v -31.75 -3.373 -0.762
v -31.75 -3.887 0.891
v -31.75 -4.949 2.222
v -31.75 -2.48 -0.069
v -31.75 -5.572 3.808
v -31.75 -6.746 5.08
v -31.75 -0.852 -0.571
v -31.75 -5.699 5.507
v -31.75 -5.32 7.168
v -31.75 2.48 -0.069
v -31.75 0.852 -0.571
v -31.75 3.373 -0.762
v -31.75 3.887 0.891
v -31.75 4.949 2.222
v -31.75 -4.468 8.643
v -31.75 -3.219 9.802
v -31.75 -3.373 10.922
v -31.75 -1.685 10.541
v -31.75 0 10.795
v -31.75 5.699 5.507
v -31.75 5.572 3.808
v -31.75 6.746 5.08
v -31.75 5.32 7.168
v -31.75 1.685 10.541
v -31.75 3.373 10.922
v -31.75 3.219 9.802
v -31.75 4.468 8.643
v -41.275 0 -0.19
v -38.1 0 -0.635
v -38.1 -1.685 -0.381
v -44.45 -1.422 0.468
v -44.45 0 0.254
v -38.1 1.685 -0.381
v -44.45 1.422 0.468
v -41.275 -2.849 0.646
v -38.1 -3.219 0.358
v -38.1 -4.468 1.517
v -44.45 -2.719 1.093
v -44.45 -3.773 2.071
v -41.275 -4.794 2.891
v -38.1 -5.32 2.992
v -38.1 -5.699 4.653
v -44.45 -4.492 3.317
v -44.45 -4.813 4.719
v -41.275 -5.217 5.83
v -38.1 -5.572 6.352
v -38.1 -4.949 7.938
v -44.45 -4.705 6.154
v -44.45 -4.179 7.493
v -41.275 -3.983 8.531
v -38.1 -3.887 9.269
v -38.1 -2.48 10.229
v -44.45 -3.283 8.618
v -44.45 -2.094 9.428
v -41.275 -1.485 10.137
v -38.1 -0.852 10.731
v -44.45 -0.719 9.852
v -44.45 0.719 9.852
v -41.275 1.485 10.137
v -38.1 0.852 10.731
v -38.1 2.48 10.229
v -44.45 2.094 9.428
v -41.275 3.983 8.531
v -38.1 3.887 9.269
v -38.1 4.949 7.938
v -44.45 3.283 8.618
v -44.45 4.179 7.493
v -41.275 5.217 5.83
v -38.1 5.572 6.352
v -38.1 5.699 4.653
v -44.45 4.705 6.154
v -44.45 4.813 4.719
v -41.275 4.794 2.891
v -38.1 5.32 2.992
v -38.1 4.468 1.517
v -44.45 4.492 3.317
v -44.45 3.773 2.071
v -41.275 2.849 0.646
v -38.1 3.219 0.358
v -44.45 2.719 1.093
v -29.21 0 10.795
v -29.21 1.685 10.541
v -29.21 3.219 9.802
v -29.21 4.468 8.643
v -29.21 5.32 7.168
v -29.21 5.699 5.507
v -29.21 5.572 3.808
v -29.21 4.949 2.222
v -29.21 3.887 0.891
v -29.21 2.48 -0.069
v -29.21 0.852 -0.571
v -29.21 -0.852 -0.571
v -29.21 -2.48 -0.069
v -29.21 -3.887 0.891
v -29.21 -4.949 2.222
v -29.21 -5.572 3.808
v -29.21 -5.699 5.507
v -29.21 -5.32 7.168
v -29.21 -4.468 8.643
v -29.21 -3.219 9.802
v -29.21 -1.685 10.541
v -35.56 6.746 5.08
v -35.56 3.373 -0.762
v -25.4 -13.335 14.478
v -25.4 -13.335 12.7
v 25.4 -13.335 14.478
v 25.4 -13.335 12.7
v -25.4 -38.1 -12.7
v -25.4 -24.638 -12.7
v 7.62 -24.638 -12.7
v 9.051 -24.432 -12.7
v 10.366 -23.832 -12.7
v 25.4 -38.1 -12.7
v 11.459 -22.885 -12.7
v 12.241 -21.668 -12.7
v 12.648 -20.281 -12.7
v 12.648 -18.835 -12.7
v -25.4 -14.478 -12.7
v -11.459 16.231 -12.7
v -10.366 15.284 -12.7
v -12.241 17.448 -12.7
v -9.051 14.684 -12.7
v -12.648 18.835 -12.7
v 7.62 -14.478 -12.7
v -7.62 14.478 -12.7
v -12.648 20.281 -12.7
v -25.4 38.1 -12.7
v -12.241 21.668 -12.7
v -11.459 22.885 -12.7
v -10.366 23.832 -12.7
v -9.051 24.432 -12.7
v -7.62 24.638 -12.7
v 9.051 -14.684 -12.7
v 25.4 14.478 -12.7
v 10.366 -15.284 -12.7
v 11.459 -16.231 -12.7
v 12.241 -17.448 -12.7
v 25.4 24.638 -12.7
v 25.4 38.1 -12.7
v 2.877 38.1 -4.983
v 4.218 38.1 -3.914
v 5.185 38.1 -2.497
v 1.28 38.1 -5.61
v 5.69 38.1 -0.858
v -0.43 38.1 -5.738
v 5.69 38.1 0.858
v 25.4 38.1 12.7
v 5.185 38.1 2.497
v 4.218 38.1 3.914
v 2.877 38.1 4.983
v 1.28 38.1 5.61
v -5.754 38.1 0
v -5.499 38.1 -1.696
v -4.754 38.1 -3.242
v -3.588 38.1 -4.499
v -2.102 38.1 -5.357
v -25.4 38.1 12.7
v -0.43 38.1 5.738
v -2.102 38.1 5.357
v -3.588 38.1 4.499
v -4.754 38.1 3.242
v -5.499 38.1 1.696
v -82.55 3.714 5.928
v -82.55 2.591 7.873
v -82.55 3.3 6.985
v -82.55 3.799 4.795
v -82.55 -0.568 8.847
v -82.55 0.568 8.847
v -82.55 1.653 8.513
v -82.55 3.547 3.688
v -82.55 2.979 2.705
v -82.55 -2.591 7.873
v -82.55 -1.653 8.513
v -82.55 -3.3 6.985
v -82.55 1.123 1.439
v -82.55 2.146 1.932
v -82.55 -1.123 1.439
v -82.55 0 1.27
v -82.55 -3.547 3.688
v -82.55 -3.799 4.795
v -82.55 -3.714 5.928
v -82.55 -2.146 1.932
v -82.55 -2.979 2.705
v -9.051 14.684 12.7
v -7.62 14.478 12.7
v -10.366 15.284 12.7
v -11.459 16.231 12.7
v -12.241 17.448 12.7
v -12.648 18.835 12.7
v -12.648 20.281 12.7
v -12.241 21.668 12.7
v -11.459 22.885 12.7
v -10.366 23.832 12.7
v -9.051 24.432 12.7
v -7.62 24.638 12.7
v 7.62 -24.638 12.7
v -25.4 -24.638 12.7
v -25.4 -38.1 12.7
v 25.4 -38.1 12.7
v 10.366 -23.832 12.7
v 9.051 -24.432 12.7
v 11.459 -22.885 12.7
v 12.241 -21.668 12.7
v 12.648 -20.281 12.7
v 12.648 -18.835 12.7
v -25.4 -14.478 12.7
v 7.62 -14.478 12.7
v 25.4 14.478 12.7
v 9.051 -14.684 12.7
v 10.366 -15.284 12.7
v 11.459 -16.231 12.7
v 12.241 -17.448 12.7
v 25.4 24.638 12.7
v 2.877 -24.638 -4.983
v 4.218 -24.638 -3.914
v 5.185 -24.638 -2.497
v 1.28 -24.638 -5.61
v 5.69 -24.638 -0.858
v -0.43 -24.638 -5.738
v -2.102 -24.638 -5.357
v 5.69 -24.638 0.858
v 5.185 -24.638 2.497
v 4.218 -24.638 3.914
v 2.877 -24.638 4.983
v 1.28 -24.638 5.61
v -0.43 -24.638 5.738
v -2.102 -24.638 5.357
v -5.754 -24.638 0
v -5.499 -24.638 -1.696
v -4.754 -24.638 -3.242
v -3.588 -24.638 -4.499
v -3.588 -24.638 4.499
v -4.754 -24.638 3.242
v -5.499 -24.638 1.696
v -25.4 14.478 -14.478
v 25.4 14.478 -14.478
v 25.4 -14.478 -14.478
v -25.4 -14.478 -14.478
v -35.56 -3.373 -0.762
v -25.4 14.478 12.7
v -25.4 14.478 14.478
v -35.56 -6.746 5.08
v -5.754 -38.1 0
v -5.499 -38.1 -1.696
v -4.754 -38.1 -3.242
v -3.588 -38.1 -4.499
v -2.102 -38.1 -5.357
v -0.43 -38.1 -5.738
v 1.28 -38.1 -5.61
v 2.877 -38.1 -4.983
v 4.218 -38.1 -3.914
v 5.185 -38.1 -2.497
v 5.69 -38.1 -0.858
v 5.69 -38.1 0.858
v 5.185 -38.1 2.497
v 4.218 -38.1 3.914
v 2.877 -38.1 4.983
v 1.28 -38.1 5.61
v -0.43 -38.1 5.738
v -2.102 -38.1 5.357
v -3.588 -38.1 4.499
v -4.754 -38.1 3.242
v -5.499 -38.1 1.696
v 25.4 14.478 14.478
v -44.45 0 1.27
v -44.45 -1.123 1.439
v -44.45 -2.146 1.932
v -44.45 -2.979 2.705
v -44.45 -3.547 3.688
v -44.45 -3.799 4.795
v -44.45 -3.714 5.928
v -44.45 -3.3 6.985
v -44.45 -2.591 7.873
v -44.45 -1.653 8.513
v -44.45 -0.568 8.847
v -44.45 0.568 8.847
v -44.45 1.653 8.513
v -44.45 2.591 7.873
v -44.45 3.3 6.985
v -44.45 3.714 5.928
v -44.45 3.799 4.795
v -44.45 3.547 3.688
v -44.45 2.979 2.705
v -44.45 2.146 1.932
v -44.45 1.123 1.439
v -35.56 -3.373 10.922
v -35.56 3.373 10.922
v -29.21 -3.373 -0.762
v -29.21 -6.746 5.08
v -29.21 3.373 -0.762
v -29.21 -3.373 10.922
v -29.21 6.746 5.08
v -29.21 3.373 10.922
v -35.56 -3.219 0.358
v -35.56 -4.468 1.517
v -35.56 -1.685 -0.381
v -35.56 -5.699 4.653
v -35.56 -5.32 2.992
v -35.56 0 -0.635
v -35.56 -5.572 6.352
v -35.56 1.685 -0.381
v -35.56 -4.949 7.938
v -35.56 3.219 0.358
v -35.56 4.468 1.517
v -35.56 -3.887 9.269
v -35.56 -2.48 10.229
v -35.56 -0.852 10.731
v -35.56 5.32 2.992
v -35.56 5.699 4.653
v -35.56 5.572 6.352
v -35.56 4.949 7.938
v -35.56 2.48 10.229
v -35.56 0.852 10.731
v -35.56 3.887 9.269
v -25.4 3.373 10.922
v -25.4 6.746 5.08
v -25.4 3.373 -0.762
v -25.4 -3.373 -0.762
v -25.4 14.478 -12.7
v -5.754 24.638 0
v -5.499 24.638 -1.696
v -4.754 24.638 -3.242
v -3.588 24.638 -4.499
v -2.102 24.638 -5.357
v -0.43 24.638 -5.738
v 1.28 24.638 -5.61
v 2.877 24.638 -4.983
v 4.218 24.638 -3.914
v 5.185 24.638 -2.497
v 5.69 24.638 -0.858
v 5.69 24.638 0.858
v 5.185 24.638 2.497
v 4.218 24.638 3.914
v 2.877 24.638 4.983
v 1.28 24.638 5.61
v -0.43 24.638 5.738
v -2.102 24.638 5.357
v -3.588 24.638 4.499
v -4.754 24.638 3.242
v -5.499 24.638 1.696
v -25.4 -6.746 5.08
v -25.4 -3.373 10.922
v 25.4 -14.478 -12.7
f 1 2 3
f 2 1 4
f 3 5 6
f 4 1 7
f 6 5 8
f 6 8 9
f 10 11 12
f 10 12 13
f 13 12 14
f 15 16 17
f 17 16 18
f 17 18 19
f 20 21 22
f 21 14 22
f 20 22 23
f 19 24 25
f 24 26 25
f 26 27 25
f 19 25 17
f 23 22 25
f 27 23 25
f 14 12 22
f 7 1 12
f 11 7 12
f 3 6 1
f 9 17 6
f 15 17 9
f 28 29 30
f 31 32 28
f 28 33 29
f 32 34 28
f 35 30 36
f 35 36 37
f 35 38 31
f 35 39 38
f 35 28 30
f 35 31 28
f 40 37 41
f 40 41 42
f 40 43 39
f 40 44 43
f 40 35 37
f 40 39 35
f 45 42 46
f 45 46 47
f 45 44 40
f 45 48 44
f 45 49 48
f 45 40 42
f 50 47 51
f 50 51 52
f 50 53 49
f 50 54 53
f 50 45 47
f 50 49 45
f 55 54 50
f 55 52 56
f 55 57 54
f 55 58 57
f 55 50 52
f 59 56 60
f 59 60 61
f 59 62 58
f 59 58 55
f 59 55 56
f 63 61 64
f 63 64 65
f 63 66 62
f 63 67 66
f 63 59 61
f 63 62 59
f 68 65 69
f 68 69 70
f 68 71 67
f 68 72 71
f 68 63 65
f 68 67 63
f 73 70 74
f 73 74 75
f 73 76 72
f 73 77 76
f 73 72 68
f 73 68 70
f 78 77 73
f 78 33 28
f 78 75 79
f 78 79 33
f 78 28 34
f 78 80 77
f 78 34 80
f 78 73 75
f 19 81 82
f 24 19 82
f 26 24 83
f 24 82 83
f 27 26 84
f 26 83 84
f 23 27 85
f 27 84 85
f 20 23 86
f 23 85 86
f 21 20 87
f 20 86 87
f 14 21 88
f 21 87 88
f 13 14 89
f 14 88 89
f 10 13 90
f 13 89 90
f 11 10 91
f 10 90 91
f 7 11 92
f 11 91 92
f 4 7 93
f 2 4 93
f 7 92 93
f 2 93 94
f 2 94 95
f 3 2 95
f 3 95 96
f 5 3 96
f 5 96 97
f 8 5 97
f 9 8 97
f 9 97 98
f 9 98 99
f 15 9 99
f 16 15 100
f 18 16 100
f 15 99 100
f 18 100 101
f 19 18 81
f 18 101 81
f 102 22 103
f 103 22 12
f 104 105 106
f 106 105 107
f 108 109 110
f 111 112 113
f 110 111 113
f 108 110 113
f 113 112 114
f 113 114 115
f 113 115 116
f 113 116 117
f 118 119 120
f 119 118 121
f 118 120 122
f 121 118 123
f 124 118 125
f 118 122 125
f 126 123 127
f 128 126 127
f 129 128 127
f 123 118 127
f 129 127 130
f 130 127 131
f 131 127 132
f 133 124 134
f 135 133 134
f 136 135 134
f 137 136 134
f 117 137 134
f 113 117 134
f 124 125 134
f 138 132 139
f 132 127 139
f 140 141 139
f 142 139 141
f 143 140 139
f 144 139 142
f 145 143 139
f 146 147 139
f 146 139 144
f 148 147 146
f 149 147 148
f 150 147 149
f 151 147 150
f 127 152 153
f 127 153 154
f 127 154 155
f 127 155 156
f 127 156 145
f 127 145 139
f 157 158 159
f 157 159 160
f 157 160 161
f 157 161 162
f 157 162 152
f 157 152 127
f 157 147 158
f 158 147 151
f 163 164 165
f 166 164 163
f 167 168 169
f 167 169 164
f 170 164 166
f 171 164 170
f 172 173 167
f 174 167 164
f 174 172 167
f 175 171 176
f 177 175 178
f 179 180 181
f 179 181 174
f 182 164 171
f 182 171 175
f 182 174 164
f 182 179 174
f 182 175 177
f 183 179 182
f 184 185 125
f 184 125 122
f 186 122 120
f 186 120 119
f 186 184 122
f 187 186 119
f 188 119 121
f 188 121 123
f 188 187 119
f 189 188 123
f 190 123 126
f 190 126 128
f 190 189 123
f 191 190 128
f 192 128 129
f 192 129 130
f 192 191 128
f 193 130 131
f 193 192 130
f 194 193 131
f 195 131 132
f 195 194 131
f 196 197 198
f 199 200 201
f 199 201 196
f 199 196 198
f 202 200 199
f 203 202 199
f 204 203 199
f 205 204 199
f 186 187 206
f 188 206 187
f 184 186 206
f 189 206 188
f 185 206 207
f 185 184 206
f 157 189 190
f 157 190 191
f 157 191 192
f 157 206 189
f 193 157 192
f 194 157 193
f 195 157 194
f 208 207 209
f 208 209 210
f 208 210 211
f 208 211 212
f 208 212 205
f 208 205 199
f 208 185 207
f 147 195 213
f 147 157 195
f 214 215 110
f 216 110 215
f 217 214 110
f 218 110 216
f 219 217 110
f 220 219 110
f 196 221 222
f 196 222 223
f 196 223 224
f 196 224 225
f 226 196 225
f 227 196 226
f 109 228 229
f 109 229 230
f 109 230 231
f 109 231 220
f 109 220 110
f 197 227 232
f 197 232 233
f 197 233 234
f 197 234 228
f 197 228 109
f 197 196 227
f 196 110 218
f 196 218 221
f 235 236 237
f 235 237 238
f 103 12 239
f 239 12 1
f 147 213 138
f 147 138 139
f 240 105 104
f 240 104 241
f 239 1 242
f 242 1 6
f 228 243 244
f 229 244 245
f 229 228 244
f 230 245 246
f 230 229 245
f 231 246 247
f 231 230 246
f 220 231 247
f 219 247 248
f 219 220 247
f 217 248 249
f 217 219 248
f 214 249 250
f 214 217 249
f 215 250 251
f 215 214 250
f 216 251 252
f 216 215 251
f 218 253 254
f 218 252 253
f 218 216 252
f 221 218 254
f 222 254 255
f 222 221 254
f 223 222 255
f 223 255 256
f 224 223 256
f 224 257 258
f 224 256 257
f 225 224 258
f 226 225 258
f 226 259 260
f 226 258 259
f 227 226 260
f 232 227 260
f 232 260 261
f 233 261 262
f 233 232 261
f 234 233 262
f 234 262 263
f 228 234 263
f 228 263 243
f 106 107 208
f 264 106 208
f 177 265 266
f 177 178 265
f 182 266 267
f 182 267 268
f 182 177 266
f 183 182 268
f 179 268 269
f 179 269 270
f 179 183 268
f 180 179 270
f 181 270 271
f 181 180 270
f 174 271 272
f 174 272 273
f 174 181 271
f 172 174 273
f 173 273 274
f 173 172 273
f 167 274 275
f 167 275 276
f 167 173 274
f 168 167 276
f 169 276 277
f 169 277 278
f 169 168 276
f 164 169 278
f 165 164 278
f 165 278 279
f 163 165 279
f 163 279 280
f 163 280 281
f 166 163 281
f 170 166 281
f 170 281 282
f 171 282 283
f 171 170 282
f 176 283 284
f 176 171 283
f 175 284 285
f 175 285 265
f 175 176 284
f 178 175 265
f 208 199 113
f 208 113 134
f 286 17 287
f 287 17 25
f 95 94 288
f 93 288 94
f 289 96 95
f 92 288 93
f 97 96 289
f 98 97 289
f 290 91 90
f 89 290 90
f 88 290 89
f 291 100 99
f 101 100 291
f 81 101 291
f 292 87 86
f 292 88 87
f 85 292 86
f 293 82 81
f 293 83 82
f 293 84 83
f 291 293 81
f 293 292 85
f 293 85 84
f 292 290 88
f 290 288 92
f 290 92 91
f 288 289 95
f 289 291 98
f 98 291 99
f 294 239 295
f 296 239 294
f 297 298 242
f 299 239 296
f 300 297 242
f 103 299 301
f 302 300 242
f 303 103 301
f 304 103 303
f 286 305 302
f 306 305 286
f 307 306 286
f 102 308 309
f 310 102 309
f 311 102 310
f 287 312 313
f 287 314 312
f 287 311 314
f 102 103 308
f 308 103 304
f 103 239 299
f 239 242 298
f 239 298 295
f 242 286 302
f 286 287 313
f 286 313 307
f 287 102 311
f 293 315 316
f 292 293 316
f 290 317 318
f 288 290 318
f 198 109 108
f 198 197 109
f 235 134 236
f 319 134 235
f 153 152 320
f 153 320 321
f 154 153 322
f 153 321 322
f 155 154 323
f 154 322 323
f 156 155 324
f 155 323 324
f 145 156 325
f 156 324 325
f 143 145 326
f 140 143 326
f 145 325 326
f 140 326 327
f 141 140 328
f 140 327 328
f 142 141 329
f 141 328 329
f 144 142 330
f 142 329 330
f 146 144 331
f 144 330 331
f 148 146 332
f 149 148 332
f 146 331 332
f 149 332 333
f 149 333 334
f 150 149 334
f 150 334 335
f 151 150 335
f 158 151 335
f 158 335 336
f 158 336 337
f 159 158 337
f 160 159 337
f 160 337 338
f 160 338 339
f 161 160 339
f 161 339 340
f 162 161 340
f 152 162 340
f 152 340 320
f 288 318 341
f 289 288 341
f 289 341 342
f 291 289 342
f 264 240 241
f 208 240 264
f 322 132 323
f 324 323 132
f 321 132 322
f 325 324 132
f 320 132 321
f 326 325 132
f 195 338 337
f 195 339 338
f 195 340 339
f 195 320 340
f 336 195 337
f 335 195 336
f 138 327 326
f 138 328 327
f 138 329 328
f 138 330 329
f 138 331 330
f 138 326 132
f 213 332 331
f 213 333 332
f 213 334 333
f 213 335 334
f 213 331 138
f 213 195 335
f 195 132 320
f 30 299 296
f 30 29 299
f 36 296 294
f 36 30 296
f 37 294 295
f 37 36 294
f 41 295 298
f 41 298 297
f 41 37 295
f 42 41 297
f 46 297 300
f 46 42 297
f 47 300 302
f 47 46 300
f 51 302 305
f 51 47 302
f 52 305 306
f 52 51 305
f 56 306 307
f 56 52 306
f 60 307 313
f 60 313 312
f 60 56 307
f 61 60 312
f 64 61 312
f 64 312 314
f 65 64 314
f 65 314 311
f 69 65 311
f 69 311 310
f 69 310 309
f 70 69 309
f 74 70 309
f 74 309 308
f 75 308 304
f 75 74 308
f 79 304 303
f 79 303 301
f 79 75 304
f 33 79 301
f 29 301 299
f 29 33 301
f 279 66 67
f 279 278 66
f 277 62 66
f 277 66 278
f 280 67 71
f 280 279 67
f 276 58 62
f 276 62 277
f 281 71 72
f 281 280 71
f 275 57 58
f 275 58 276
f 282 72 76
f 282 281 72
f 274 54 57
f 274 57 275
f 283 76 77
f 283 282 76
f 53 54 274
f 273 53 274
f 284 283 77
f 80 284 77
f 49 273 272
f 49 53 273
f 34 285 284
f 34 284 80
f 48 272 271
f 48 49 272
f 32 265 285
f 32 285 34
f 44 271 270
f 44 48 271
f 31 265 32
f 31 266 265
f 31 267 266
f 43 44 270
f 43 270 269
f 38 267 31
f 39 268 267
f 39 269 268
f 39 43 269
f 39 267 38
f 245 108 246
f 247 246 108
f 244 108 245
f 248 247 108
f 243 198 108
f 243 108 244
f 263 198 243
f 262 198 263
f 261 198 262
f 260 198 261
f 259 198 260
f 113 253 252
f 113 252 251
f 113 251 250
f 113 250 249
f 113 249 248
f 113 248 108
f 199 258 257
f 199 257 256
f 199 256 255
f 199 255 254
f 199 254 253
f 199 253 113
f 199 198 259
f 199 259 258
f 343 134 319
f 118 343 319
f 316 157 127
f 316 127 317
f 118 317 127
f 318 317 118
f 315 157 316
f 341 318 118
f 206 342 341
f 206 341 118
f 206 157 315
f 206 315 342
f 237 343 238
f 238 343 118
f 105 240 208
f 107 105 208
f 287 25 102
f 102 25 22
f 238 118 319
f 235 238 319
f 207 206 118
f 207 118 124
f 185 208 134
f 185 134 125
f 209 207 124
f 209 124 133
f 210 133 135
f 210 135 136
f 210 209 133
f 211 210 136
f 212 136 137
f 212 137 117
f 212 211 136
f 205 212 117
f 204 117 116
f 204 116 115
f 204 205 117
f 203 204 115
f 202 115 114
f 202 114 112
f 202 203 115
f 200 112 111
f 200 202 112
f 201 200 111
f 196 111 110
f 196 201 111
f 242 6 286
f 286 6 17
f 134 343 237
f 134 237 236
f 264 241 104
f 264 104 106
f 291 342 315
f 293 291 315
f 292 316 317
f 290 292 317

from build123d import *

# Parameters (mm, degrees)
EXTRUDE1_DEPTH              = 12.7
F_1_2_20_TAPPED_HOLE1_D     = 11.50874
F_1_2_20_TAPPED_HOLE1_DEPTH = 13.462
SKETCH5_W                   = 50.8
SKETCH5_H                   = 27.813
EXTRUDE5_DEPTH              = 1.778
SKETCH7_W                   = 50.8
SKETCH7_H                   = 28.956
EXTRUDE6_DEPTH              = 1.778
BOSS_EXTRUDE1_DEPTH         = 10.16
SKETCH11_R                  = 6.745760545
SKETCH11_R_2                = 5.715
CUT_EXTRUDE1_DEPTH          = 2.54


with BuildPart() as part:
    # Sketch1 → Extrude1 (new, symmetric)
    with BuildSketch(Plane.XY):
        with BuildLine():
            Line((-25.4, -38.1), (25.4, -38.1))
            Line((25.4, -38.1), (25.4, 14.478))
            Line((25.4, 14.478), (-7.62, 14.478))
            ThreePointArc((-7.62, 14.478), (-12.7, 19.558), (-7.62, 24.638))
            Line((-7.62, 24.638), (25.4, 24.638))
            Line((25.4, 24.638), (25.4, 38.1))
            Line((25.4, 38.1), (-25.4, 38.1))
            Line((-25.4, 38.1), (-25.4, -14.478))
            Line((-25.4, -14.478), (7.62, -14.478))
            ThreePointArc((7.62, -14.478), (12.7, -19.558), (7.62, -24.638))
            Line((7.62, -24.638), (-25.4, -24.638))
            Line((-25.4, -24.638), (-25.4, -38.1))
        make_face()
    extrude(amount=EXTRUDE1_DEPTH, both=True)

    # 1/2-20 Tapped Hole1
    with Locations(Plane(origin=(0, 38.1, 0), x_dir=(1, 0, 0), z_dir=(0, 1, 0))):
        with Locations((0, 0)):
            f_1_2_20_tapped_hole1 = Hole(F_1_2_20_TAPPED_HOLE1_D / 2, depth=F_1_2_20_TAPPED_HOLE1_DEPTH)

    # Mirror1: 1/2-20 Tapped Hole1 across plane
    add(f_1_2_20_tapped_hole1.mirror(Plane.ZX), mode=Mode.SUBTRACT)

    # Sketch10 → Boss-Extrude1 (add)
    with BuildSketch(Plane.ZY.offset(25.4)):
        Polygon((5.08, 6.745760545), (-0.762, 3.372880273), (-0.762, -3.372880273), (5.08, -6.745760545), (10.922, -3.372880273), (10.922, 3.372880273), align=None)
    extrude(amount=BOSS_EXTRUDE1_DEPTH)

    # Sketch11 → Cut-Extrude1 (cut)
    with BuildSketch(Plane.ZY.offset(29.21)):
        with Locations((5.08, 0)):
            Circle(SKETCH11_R)
        with Locations((5.08, 0)):
            Circle(SKETCH11_R_2, mode=Mode.SUBTRACT)
    extrude(amount=CUT_EXTRUDE1_DEPTH, mode=Mode.SUBTRACT)

    # Sketch12 → Revolve1 (revolve)
    with BuildSketch(Plane(origin=(0, 0, 0), x_dir=(1, 0, 0), z_dir=(0, 1, 0))):
        Polygon((-44.45, -0.254), (-44.45, -1.27), (-82.55, -1.27), (-82.55, -5.08), (-35.56, -5.08), (-35.56, 0.635), (-38.1, 0.635), align=None)
    revolve(axis=Axis((-35.56, 0, 5.08), (-1, 0, 0)))


with BuildPart() as body_2:
    # Sketch5 → Extrude5 (new body)
    with BuildSketch(Plane.XY.offset(12.7)):
        with Locations((0, 0.5715)):
            Rectangle(SKETCH5_W, SKETCH5_H)
    extrude(amount=EXTRUDE5_DEPTH)


with BuildPart() as body_3:
    # Sketch7 → Extrude6 (new body)
    with BuildSketch(Plane(origin=(0, 0, -12.7), x_dir=(-1, 0, 0), z_dir=(0, 0, -1))):
        Rectangle(SKETCH7_W, SKETCH7_H)
    extrude(amount=EXTRUDE6_DEPTH)


solid = Compound([part.part, body_2.part, body_3.part])
